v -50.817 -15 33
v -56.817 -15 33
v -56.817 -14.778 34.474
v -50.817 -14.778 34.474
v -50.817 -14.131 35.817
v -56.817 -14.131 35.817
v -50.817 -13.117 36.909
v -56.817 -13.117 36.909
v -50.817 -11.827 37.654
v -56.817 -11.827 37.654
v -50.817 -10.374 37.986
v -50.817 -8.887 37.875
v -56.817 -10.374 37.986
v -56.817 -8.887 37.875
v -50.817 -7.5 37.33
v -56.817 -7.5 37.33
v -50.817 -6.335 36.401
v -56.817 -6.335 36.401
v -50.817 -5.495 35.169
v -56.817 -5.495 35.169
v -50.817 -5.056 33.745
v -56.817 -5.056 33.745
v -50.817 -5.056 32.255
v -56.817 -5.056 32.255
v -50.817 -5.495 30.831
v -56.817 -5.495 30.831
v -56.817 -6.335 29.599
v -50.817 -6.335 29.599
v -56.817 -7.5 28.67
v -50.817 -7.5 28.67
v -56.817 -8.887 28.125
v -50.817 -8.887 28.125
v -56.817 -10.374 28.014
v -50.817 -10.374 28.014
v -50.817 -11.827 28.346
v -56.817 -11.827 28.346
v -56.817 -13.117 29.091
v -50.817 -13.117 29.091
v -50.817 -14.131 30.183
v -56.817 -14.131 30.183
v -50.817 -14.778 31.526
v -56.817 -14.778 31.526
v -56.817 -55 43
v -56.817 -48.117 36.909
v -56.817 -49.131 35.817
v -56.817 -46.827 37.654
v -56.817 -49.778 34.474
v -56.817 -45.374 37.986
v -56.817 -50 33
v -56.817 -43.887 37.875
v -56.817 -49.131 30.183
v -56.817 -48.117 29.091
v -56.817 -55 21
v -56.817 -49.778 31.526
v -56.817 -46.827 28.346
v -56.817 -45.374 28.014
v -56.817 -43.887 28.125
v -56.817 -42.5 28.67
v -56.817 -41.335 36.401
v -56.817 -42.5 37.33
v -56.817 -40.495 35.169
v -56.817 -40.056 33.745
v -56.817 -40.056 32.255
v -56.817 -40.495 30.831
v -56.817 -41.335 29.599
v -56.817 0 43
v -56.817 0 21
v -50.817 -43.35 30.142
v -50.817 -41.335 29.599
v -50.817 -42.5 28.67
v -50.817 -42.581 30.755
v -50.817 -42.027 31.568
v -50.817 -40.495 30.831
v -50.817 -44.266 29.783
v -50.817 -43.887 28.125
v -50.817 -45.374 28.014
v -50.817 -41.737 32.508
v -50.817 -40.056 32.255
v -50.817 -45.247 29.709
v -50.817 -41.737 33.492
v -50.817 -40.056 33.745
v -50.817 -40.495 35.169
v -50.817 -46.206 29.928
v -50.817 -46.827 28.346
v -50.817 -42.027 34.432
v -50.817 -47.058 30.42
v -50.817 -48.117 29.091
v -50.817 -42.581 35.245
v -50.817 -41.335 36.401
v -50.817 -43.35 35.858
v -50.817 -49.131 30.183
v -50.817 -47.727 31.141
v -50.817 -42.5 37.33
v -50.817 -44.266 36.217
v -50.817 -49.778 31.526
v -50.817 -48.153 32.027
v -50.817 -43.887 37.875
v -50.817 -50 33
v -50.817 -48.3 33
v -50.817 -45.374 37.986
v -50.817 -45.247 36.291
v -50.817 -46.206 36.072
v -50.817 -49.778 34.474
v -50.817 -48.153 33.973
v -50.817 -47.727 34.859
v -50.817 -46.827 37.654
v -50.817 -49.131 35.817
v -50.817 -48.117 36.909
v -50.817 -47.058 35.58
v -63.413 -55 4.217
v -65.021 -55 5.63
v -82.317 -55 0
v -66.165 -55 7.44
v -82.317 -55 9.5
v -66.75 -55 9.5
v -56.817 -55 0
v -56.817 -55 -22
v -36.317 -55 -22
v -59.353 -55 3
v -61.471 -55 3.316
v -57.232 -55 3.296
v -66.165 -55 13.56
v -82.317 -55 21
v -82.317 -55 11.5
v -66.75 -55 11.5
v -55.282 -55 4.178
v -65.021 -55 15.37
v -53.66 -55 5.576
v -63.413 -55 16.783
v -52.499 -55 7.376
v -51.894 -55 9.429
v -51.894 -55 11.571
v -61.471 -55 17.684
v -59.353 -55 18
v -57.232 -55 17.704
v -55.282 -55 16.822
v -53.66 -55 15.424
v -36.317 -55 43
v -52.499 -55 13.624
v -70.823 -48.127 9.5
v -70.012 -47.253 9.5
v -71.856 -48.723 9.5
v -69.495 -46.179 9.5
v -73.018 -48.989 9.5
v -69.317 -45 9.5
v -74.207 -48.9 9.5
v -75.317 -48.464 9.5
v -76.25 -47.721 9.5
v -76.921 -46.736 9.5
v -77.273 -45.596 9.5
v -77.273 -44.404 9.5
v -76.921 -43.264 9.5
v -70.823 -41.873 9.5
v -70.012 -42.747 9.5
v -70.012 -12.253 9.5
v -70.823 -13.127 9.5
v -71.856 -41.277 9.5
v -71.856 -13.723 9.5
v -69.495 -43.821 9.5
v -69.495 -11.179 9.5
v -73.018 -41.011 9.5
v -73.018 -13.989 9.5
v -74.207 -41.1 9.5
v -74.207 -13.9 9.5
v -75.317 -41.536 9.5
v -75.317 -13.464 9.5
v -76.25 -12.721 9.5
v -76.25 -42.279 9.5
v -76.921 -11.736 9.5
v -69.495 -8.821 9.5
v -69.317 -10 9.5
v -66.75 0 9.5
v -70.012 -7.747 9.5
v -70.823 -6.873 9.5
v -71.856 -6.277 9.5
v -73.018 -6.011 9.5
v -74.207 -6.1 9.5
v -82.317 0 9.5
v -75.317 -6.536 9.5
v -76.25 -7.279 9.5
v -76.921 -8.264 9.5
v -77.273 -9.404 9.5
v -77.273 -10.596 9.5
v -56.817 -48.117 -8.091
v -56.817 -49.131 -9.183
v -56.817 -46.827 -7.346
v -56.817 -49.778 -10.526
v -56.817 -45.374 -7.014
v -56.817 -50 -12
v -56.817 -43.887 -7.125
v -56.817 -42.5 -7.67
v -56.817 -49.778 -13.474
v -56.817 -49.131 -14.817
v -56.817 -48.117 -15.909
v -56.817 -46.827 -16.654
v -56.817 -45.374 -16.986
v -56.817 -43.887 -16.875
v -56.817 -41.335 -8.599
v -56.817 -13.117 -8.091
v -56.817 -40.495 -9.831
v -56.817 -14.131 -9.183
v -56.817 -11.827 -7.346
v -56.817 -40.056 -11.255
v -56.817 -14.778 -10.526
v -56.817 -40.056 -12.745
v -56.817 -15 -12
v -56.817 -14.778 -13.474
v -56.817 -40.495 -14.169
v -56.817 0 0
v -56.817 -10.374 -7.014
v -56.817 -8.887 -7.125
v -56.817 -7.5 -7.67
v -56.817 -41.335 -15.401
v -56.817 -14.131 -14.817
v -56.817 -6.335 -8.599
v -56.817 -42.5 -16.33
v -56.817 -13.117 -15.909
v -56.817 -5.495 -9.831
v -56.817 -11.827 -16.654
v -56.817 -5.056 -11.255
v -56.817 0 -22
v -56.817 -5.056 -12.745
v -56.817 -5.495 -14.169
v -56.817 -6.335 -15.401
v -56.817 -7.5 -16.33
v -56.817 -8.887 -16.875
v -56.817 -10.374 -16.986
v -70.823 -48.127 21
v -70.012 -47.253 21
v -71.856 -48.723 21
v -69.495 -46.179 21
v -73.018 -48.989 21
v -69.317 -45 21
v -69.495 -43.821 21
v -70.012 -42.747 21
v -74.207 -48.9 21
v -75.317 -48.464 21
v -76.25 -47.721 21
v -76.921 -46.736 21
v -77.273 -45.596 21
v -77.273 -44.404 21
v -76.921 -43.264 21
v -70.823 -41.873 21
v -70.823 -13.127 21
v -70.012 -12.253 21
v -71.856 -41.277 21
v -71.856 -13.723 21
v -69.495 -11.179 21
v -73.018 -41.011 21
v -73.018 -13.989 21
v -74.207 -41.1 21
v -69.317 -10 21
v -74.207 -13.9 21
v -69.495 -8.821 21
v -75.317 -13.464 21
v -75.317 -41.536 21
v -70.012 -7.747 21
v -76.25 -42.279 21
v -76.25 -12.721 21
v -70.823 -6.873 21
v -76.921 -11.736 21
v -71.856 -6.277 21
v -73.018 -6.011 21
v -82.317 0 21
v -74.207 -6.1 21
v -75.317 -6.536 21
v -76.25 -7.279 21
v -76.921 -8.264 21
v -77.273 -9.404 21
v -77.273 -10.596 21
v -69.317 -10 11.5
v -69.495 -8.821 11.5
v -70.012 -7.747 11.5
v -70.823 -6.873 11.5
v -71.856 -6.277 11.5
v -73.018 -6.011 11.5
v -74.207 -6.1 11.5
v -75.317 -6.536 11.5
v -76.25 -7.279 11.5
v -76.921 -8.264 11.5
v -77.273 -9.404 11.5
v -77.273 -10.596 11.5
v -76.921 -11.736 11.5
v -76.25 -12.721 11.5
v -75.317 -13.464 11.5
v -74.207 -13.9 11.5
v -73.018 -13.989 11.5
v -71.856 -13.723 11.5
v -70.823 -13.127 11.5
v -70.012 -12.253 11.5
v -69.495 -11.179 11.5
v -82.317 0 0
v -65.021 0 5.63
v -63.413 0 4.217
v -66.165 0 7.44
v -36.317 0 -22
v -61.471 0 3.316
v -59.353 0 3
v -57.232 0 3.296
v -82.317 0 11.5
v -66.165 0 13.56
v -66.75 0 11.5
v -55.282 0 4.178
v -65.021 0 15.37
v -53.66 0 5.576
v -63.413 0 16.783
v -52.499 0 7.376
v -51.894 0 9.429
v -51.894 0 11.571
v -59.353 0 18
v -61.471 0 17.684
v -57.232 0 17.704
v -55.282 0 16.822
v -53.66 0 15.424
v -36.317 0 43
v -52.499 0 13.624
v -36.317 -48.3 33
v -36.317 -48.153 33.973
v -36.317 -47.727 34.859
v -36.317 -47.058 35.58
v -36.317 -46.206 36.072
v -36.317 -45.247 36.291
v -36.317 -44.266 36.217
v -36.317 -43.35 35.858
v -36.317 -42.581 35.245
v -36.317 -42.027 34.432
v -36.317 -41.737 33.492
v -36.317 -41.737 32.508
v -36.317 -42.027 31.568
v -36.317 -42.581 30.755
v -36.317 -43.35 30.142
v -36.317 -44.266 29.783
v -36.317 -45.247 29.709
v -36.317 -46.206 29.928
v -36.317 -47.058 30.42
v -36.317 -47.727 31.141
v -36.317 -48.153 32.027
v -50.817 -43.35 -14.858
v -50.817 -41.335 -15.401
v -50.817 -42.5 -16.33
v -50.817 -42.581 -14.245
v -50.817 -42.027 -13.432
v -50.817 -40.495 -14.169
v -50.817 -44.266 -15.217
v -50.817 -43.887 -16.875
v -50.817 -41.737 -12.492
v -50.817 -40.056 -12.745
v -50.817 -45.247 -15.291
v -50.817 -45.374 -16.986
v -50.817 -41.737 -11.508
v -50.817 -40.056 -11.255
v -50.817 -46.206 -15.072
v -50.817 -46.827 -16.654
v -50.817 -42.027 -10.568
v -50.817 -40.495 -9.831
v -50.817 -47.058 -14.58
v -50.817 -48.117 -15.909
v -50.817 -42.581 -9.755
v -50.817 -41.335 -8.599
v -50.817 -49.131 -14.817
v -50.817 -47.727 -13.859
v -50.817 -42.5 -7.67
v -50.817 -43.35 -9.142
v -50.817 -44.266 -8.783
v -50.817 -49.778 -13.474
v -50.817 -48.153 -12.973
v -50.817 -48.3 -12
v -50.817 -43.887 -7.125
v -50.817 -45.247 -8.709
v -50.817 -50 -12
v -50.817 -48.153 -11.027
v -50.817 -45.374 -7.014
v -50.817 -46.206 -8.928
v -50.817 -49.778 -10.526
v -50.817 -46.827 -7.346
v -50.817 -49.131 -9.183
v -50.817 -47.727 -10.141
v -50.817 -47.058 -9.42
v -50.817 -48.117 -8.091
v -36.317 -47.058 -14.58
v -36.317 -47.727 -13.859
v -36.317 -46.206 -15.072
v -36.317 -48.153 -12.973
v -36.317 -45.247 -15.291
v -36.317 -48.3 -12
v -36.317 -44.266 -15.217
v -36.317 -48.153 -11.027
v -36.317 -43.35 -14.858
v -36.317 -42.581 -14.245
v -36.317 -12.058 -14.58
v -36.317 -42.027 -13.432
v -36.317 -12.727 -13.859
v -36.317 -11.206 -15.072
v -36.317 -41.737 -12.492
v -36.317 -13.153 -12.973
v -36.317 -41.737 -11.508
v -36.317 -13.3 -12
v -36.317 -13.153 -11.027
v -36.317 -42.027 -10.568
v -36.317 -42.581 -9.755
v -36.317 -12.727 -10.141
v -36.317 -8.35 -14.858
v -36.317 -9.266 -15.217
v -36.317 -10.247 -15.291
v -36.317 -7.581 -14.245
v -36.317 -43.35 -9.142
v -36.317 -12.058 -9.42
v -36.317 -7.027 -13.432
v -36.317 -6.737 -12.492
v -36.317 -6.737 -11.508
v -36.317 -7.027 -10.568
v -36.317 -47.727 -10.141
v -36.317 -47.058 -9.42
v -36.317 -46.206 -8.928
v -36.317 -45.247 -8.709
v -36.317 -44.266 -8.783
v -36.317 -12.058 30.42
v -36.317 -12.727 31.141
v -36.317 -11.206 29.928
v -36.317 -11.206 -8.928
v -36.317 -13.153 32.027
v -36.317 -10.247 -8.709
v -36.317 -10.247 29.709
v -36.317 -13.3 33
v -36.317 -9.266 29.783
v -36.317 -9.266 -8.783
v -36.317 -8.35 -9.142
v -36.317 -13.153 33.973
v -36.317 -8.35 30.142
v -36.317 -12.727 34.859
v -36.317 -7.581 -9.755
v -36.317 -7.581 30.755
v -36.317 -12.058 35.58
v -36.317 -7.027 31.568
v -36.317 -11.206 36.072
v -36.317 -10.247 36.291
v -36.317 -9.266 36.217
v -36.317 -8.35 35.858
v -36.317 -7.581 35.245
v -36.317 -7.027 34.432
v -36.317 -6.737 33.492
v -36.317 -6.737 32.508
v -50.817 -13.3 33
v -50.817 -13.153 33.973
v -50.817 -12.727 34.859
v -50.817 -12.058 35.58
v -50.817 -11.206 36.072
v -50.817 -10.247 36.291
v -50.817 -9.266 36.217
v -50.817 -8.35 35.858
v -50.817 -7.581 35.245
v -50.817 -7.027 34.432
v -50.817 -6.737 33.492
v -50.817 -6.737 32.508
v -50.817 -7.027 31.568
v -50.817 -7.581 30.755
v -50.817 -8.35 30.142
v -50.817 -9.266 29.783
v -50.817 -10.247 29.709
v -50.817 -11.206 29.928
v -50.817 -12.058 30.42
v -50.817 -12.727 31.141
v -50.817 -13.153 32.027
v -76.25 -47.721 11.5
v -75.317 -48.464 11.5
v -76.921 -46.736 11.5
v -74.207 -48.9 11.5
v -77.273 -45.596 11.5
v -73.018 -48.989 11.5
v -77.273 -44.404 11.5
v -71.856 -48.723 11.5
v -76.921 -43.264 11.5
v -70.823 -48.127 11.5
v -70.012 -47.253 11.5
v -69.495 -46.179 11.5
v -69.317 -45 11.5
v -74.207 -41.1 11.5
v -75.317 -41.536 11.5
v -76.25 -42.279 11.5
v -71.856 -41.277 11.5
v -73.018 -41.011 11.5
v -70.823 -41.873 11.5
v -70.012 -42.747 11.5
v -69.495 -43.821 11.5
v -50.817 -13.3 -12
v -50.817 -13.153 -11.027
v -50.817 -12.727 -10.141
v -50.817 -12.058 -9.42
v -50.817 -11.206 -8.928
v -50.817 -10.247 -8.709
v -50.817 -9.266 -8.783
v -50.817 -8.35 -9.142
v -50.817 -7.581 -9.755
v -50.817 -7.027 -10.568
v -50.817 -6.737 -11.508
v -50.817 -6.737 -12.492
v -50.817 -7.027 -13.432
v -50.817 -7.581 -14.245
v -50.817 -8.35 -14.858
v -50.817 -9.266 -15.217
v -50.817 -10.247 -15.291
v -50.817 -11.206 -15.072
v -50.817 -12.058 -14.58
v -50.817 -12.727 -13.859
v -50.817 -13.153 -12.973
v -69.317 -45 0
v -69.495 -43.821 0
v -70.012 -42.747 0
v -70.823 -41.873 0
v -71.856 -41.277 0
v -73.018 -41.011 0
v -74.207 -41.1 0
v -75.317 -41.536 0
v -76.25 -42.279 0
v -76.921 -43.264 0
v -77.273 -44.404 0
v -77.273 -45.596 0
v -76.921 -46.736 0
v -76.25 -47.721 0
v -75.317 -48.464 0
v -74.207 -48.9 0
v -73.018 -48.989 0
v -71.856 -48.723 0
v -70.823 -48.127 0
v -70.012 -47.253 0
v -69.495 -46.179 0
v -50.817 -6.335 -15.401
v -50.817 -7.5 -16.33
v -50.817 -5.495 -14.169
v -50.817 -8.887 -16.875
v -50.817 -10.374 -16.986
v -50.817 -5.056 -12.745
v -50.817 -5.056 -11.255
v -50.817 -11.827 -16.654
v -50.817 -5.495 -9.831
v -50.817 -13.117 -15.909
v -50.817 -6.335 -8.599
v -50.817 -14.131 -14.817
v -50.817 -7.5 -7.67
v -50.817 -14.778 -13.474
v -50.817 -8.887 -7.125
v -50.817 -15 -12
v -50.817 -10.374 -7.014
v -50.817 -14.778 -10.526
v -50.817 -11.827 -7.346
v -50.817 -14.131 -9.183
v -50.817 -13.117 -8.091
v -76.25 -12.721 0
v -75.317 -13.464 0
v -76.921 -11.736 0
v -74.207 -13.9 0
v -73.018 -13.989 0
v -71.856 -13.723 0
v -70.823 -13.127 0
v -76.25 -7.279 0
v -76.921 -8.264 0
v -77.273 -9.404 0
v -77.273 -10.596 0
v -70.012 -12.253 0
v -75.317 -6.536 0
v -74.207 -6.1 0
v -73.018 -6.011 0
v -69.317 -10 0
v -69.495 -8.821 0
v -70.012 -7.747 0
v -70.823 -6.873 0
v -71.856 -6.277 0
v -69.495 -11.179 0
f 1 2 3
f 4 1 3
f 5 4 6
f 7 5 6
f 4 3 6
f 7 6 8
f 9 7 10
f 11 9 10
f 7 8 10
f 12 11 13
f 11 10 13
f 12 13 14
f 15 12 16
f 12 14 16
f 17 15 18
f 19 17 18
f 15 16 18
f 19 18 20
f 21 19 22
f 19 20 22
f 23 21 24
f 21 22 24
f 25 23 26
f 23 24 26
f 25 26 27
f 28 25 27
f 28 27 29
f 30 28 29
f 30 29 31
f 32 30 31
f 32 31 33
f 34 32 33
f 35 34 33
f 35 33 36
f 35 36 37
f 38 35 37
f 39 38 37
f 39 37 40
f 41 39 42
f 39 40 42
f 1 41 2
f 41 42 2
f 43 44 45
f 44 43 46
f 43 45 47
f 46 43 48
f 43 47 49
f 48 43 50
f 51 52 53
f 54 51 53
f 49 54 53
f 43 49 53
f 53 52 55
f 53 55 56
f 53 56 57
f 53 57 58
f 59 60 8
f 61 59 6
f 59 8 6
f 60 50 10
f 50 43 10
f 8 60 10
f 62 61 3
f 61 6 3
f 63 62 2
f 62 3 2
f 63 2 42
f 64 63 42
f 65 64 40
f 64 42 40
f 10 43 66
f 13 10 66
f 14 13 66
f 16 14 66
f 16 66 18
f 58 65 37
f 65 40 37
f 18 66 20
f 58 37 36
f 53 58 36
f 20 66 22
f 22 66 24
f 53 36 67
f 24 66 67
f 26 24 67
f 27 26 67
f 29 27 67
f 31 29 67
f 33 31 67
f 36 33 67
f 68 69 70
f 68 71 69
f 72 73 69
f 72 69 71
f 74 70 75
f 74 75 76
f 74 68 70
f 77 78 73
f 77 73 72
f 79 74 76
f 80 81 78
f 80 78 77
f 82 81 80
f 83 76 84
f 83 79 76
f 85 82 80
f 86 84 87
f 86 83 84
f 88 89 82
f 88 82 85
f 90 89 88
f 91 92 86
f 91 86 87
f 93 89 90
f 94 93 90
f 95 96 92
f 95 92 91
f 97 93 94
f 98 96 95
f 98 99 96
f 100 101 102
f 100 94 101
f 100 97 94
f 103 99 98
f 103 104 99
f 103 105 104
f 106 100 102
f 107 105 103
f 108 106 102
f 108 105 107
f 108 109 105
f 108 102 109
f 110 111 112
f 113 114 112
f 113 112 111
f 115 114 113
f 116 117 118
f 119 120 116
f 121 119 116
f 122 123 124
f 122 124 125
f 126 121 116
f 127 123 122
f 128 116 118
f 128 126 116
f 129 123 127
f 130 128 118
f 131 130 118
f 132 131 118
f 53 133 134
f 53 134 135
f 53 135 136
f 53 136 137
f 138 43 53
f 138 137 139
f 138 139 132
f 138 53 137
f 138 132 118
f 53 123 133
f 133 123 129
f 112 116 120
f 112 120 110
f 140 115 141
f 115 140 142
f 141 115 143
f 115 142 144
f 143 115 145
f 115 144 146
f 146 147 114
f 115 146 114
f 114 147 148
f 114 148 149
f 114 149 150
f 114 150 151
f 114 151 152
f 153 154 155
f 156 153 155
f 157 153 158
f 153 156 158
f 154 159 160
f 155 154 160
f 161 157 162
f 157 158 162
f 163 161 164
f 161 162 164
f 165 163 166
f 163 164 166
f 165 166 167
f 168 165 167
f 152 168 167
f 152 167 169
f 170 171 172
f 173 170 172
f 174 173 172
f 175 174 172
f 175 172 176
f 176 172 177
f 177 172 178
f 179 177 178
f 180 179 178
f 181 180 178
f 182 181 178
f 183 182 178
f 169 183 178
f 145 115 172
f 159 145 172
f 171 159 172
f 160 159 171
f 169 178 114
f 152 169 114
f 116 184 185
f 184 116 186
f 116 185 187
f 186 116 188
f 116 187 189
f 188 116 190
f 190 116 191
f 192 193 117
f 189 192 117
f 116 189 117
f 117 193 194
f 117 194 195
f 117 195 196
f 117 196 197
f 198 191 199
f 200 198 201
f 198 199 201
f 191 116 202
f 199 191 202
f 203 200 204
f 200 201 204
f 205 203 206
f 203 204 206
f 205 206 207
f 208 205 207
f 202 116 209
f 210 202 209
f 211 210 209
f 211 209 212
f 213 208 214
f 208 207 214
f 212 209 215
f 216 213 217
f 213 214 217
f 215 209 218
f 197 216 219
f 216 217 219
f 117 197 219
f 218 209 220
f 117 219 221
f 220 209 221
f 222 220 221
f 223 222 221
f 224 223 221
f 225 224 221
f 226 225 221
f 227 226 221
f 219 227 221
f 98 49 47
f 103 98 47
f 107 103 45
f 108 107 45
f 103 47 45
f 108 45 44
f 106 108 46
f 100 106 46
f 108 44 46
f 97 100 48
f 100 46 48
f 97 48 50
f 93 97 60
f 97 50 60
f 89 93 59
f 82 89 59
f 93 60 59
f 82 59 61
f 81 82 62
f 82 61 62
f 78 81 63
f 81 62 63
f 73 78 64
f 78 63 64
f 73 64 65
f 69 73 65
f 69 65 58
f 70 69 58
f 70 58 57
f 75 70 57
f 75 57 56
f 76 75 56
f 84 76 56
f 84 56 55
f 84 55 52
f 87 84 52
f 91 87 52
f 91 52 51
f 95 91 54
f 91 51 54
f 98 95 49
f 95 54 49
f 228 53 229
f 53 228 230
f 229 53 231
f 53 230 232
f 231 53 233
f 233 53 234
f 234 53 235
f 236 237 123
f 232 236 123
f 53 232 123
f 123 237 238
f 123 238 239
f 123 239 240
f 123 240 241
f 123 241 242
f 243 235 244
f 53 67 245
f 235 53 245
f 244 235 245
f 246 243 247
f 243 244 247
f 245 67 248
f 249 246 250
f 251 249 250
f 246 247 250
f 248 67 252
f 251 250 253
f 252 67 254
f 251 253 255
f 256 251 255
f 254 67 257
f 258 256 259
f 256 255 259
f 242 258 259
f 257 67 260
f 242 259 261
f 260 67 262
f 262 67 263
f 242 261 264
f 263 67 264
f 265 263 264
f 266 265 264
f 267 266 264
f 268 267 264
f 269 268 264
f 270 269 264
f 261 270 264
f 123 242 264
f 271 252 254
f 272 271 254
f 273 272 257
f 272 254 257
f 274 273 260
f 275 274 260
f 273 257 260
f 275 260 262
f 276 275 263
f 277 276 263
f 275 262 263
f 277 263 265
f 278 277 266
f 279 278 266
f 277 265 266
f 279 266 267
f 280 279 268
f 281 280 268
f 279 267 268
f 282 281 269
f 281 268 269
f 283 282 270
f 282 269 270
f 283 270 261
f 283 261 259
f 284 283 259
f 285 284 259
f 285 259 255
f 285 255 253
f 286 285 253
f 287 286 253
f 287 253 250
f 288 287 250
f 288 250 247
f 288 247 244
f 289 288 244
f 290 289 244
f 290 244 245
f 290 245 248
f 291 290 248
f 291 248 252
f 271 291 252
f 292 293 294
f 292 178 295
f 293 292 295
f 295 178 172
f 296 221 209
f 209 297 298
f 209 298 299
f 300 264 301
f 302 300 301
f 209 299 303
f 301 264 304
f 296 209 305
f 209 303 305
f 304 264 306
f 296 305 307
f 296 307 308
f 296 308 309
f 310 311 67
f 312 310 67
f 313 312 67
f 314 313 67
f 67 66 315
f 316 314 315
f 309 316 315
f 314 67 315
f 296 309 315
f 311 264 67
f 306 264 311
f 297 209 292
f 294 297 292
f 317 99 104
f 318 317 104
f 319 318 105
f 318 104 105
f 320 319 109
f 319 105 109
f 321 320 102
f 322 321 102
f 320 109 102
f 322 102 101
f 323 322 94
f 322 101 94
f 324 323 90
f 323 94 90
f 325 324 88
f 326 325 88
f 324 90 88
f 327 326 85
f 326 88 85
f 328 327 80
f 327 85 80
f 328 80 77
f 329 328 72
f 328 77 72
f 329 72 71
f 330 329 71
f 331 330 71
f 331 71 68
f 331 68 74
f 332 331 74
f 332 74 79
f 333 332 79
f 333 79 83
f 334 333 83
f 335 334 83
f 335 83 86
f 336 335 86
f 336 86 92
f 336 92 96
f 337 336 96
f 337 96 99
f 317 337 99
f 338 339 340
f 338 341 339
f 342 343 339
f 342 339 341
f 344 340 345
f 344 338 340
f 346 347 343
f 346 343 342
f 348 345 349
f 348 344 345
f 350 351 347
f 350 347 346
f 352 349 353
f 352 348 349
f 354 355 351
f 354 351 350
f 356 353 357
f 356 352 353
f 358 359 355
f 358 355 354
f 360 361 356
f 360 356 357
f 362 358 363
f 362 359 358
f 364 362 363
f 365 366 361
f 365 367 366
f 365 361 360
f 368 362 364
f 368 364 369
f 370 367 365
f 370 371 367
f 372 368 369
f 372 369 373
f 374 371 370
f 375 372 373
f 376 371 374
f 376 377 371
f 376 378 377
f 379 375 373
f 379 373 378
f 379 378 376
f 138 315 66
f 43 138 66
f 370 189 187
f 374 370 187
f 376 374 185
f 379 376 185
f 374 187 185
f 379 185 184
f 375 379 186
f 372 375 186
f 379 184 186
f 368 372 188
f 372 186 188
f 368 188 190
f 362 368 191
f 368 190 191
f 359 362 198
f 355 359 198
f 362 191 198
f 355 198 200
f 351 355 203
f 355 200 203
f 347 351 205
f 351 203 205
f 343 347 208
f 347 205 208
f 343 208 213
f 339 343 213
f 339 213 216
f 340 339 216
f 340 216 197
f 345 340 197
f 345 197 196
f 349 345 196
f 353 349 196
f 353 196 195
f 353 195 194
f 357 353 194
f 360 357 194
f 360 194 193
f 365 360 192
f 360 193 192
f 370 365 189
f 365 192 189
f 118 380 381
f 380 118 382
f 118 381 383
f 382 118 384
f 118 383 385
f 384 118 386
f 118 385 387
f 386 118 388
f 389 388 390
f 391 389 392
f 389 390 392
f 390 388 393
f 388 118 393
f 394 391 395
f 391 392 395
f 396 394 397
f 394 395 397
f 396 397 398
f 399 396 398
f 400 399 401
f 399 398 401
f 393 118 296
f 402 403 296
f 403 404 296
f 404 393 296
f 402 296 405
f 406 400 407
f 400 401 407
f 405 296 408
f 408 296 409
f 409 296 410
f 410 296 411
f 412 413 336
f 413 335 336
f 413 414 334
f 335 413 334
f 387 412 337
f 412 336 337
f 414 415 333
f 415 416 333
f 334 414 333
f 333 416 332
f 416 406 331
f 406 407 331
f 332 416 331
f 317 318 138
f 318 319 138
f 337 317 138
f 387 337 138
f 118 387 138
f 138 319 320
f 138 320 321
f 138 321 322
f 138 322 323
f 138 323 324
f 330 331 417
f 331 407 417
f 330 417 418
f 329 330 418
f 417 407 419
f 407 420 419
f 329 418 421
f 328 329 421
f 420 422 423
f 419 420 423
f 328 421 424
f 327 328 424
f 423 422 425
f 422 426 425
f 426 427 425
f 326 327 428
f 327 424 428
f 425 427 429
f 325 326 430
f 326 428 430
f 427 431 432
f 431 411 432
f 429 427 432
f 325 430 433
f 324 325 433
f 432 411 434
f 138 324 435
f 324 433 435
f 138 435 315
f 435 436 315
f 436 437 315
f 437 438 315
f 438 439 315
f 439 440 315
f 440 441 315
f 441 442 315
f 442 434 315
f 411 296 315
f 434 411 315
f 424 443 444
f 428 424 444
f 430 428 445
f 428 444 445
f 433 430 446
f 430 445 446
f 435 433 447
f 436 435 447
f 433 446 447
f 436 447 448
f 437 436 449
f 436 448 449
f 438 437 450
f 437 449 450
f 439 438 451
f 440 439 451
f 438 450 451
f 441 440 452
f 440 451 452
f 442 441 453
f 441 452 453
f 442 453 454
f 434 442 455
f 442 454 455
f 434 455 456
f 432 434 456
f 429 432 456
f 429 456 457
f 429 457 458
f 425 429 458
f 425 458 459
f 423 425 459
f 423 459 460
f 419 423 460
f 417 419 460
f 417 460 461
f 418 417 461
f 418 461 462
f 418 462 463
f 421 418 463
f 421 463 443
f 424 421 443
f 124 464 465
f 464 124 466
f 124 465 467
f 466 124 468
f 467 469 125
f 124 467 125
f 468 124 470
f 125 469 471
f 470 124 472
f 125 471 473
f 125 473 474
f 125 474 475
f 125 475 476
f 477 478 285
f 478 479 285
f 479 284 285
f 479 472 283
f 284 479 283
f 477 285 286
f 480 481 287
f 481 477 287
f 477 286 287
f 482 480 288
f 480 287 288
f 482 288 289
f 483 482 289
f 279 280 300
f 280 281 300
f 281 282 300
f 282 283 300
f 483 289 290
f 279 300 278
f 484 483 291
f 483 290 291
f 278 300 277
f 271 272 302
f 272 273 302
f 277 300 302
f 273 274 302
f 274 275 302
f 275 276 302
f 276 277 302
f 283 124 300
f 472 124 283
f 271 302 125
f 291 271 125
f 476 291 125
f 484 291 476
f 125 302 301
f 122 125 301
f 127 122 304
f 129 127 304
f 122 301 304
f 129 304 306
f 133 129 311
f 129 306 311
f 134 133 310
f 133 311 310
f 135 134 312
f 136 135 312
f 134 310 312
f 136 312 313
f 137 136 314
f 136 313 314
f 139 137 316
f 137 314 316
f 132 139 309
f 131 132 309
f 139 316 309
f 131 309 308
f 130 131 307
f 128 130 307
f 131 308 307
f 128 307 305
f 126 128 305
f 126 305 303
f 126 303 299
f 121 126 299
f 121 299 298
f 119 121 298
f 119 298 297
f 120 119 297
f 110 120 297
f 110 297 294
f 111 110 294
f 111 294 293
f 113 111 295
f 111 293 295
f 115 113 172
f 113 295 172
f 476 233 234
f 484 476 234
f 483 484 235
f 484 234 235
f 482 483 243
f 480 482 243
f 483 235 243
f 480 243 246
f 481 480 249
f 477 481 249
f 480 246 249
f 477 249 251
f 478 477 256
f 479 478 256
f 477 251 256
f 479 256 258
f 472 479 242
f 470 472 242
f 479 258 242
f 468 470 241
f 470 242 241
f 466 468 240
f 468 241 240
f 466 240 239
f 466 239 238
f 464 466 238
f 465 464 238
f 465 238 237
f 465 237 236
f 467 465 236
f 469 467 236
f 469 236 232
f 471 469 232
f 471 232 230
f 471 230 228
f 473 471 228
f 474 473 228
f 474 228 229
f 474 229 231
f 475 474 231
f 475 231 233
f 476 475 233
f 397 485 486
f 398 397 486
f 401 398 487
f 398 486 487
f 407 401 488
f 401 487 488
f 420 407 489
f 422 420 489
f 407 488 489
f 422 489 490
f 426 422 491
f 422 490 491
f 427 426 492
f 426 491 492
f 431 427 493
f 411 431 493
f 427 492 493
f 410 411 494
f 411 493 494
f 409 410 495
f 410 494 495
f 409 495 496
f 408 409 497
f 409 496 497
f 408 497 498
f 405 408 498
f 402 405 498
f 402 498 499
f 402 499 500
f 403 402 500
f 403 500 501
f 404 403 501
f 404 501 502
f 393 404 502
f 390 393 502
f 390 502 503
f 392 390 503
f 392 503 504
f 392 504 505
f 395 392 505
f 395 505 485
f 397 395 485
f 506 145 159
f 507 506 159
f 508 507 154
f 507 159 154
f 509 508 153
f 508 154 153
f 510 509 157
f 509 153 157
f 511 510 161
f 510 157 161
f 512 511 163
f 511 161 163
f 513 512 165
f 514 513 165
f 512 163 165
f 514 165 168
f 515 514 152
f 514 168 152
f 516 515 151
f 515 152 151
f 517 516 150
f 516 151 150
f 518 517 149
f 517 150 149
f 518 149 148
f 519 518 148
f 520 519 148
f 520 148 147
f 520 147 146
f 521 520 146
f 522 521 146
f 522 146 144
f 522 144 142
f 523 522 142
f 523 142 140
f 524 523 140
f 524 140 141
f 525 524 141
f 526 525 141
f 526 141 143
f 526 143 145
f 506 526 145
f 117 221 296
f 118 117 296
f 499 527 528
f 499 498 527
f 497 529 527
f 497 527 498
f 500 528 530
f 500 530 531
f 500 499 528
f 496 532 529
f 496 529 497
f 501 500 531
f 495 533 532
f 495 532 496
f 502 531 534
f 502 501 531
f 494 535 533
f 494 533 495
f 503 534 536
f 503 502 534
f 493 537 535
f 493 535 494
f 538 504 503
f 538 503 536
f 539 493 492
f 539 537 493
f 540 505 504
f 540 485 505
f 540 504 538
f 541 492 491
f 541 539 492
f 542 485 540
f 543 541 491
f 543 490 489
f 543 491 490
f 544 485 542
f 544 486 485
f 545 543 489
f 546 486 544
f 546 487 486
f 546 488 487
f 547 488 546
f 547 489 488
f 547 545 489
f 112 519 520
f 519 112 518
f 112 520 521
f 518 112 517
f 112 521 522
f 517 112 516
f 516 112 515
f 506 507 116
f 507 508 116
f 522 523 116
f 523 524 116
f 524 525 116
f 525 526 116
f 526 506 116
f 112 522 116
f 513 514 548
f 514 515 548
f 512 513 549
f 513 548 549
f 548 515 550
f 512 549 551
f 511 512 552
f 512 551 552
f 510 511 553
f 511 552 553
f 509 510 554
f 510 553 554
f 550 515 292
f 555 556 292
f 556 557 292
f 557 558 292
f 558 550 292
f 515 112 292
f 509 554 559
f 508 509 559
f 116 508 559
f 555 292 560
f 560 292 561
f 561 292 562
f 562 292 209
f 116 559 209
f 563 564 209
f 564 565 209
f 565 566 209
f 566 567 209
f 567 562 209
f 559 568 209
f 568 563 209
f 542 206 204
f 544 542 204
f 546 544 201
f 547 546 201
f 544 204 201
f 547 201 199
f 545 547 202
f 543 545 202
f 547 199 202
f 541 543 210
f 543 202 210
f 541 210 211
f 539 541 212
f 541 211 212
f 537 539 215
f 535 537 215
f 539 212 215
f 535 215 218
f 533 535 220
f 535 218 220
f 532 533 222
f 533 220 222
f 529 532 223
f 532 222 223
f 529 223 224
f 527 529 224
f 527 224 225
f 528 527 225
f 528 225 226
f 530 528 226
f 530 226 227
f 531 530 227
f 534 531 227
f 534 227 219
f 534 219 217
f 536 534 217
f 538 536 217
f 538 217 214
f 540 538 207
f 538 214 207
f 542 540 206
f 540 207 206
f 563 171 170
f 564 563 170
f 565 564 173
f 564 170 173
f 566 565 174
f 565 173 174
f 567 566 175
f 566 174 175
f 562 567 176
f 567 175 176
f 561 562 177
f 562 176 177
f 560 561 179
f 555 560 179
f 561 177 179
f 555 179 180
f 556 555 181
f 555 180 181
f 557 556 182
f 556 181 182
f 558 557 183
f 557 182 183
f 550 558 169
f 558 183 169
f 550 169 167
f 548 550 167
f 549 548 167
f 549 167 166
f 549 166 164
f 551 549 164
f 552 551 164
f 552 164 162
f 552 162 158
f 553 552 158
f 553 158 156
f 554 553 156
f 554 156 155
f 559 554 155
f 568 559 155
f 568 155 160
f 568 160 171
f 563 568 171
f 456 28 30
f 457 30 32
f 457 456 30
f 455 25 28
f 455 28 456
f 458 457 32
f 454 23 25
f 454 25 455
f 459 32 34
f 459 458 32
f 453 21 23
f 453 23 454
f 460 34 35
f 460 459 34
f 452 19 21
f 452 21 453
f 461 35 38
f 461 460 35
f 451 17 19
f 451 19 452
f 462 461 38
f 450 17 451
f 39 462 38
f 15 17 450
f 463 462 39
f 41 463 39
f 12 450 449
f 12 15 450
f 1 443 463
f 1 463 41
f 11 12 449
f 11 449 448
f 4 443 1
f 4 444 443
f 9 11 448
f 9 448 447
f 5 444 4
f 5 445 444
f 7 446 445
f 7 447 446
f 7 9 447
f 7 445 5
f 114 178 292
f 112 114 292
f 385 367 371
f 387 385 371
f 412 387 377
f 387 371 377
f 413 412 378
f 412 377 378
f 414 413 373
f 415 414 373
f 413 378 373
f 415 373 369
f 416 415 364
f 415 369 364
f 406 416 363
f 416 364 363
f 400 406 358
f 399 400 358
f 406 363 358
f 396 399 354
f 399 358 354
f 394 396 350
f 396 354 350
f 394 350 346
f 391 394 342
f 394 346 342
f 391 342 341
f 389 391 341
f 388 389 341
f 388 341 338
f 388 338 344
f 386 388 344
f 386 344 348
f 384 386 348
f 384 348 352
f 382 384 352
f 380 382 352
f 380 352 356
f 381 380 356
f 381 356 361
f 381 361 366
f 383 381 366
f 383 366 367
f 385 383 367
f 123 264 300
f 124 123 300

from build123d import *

# Parameters (mm, degrees)
F1_DEPTH = 55
F2_R     = 4
F3_DEPTH = 25
F4_R     = 5
F4_R_2   = 3.3
F5_DEPTH = 6
F6_DEPTH = 25
F7_R     = 5
F7_R_2   = 3.3
F8_DEPTH = 6
F9_DEPTH = 25


with BuildPart() as f1:
    # F0 (on Front) → F1 (new body)
    with BuildSketch(Plane.XZ):
        with BuildLine():
            Line((-36.317323, 43), (-56.817323, 43))
            Line((-56.817323, 43), (-56.817323, 21))
            Line((-56.817323, 21), (-82.317323, 21))
            Line((-82.317323, 21), (-82.317323, 11.5))
            Line((-82.317323, 11.5), (-66.750358, 11.5))
            ThreePointArc((-66.750358, 11.5), (-51.817323, 10.5), (-66.750358, 9.5))
            Line((-66.750358, 9.5), (-82.317323, 9.5))
            Line((-82.317323, 9.5), (-82.317323, 0))
            Line((-82.317323, 0), (-56.817323, 0))
            Line((-56.817323, 0), (-56.817323, -22))
            Line((-56.817323, -22), (-36.317323, -22))
            Line((-36.317323, -22), (-36.317323, 43))
        make_face()
    extrude(amount=F1_DEPTH)

    # F2 (on face) → F3 (cut)
    with BuildSketch(Plane.XY.offset(21)):
        with Locations((-73.317323, -10)):
            Circle(F2_R)
        with Locations((-73.317323, -45)):
            Circle(F2_R)
    extrude(amount=-F3_DEPTH, mode=Mode.SUBTRACT)

    # F4 (on face) → F5 (cut)
    with BuildSketch(Plane(origin=(-56.817323, 0, 0), x_dir=(0, -1, 0), z_dir=(-1, 0, 0))):
        with Locations((10, -12)):
            Circle(F4_R)
        with Locations((10, -12)):
            Circle(F4_R_2, mode=Mode.SUBTRACT)
        with Locations((10, -12)):
            Circle(F4_R_2)
        with Locations((45, -12)):
            Circle(F4_R_2)
        with Locations((45, -12)):
            Circle(F4_R)
        with Locations((45, -12)):
            Circle(F4_R_2, mode=Mode.SUBTRACT)
    extrude(amount=-F5_DEPTH, mode=Mode.SUBTRACT)

    # F4 (on face) → F6 (cut)
    with BuildSketch(Plane(origin=(-56.817323, 0, 0), x_dir=(0, -1, 0), z_dir=(-1, 0, 0))):
        with Locations((10, -12)):
            Circle(F4_R_2)
        with Locations((45, -12)):
            Circle(F4_R_2)
    extrude(amount=-F6_DEPTH, mode=Mode.SUBTRACT)

    # F7 (on face) → F8 (cut)
    with BuildSketch(Plane(origin=(-56.817323, 0, 0), x_dir=(0, -1, 0), z_dir=(-1, 0, 0))):
        with Locations((10, 33)):
            Circle(F7_R)
        with Locations((10, 33)):
            Circle(F7_R_2, mode=Mode.SUBTRACT)
        with Locations((45, 33)):
            Circle(F7_R)
        with Locations((45, 33)):
            Circle(F7_R_2, mode=Mode.SUBTRACT)
    extrude(amount=-F8_DEPTH, mode=Mode.SUBTRACT)

    # F7 (on face) → F9 (cut)
    with BuildSketch(Plane(origin=(-56.817323, 0, 0), x_dir=(0, -1, 0), z_dir=(-1, 0, 0))):
        with Locations((10, 33)):
            Circle(F7_R_2)
        with Locations((45, 33)):
            Circle(F7_R_2)
    extrude(amount=-F9_DEPTH, mode=Mode.SUBTRACT)


solid = f1.part
